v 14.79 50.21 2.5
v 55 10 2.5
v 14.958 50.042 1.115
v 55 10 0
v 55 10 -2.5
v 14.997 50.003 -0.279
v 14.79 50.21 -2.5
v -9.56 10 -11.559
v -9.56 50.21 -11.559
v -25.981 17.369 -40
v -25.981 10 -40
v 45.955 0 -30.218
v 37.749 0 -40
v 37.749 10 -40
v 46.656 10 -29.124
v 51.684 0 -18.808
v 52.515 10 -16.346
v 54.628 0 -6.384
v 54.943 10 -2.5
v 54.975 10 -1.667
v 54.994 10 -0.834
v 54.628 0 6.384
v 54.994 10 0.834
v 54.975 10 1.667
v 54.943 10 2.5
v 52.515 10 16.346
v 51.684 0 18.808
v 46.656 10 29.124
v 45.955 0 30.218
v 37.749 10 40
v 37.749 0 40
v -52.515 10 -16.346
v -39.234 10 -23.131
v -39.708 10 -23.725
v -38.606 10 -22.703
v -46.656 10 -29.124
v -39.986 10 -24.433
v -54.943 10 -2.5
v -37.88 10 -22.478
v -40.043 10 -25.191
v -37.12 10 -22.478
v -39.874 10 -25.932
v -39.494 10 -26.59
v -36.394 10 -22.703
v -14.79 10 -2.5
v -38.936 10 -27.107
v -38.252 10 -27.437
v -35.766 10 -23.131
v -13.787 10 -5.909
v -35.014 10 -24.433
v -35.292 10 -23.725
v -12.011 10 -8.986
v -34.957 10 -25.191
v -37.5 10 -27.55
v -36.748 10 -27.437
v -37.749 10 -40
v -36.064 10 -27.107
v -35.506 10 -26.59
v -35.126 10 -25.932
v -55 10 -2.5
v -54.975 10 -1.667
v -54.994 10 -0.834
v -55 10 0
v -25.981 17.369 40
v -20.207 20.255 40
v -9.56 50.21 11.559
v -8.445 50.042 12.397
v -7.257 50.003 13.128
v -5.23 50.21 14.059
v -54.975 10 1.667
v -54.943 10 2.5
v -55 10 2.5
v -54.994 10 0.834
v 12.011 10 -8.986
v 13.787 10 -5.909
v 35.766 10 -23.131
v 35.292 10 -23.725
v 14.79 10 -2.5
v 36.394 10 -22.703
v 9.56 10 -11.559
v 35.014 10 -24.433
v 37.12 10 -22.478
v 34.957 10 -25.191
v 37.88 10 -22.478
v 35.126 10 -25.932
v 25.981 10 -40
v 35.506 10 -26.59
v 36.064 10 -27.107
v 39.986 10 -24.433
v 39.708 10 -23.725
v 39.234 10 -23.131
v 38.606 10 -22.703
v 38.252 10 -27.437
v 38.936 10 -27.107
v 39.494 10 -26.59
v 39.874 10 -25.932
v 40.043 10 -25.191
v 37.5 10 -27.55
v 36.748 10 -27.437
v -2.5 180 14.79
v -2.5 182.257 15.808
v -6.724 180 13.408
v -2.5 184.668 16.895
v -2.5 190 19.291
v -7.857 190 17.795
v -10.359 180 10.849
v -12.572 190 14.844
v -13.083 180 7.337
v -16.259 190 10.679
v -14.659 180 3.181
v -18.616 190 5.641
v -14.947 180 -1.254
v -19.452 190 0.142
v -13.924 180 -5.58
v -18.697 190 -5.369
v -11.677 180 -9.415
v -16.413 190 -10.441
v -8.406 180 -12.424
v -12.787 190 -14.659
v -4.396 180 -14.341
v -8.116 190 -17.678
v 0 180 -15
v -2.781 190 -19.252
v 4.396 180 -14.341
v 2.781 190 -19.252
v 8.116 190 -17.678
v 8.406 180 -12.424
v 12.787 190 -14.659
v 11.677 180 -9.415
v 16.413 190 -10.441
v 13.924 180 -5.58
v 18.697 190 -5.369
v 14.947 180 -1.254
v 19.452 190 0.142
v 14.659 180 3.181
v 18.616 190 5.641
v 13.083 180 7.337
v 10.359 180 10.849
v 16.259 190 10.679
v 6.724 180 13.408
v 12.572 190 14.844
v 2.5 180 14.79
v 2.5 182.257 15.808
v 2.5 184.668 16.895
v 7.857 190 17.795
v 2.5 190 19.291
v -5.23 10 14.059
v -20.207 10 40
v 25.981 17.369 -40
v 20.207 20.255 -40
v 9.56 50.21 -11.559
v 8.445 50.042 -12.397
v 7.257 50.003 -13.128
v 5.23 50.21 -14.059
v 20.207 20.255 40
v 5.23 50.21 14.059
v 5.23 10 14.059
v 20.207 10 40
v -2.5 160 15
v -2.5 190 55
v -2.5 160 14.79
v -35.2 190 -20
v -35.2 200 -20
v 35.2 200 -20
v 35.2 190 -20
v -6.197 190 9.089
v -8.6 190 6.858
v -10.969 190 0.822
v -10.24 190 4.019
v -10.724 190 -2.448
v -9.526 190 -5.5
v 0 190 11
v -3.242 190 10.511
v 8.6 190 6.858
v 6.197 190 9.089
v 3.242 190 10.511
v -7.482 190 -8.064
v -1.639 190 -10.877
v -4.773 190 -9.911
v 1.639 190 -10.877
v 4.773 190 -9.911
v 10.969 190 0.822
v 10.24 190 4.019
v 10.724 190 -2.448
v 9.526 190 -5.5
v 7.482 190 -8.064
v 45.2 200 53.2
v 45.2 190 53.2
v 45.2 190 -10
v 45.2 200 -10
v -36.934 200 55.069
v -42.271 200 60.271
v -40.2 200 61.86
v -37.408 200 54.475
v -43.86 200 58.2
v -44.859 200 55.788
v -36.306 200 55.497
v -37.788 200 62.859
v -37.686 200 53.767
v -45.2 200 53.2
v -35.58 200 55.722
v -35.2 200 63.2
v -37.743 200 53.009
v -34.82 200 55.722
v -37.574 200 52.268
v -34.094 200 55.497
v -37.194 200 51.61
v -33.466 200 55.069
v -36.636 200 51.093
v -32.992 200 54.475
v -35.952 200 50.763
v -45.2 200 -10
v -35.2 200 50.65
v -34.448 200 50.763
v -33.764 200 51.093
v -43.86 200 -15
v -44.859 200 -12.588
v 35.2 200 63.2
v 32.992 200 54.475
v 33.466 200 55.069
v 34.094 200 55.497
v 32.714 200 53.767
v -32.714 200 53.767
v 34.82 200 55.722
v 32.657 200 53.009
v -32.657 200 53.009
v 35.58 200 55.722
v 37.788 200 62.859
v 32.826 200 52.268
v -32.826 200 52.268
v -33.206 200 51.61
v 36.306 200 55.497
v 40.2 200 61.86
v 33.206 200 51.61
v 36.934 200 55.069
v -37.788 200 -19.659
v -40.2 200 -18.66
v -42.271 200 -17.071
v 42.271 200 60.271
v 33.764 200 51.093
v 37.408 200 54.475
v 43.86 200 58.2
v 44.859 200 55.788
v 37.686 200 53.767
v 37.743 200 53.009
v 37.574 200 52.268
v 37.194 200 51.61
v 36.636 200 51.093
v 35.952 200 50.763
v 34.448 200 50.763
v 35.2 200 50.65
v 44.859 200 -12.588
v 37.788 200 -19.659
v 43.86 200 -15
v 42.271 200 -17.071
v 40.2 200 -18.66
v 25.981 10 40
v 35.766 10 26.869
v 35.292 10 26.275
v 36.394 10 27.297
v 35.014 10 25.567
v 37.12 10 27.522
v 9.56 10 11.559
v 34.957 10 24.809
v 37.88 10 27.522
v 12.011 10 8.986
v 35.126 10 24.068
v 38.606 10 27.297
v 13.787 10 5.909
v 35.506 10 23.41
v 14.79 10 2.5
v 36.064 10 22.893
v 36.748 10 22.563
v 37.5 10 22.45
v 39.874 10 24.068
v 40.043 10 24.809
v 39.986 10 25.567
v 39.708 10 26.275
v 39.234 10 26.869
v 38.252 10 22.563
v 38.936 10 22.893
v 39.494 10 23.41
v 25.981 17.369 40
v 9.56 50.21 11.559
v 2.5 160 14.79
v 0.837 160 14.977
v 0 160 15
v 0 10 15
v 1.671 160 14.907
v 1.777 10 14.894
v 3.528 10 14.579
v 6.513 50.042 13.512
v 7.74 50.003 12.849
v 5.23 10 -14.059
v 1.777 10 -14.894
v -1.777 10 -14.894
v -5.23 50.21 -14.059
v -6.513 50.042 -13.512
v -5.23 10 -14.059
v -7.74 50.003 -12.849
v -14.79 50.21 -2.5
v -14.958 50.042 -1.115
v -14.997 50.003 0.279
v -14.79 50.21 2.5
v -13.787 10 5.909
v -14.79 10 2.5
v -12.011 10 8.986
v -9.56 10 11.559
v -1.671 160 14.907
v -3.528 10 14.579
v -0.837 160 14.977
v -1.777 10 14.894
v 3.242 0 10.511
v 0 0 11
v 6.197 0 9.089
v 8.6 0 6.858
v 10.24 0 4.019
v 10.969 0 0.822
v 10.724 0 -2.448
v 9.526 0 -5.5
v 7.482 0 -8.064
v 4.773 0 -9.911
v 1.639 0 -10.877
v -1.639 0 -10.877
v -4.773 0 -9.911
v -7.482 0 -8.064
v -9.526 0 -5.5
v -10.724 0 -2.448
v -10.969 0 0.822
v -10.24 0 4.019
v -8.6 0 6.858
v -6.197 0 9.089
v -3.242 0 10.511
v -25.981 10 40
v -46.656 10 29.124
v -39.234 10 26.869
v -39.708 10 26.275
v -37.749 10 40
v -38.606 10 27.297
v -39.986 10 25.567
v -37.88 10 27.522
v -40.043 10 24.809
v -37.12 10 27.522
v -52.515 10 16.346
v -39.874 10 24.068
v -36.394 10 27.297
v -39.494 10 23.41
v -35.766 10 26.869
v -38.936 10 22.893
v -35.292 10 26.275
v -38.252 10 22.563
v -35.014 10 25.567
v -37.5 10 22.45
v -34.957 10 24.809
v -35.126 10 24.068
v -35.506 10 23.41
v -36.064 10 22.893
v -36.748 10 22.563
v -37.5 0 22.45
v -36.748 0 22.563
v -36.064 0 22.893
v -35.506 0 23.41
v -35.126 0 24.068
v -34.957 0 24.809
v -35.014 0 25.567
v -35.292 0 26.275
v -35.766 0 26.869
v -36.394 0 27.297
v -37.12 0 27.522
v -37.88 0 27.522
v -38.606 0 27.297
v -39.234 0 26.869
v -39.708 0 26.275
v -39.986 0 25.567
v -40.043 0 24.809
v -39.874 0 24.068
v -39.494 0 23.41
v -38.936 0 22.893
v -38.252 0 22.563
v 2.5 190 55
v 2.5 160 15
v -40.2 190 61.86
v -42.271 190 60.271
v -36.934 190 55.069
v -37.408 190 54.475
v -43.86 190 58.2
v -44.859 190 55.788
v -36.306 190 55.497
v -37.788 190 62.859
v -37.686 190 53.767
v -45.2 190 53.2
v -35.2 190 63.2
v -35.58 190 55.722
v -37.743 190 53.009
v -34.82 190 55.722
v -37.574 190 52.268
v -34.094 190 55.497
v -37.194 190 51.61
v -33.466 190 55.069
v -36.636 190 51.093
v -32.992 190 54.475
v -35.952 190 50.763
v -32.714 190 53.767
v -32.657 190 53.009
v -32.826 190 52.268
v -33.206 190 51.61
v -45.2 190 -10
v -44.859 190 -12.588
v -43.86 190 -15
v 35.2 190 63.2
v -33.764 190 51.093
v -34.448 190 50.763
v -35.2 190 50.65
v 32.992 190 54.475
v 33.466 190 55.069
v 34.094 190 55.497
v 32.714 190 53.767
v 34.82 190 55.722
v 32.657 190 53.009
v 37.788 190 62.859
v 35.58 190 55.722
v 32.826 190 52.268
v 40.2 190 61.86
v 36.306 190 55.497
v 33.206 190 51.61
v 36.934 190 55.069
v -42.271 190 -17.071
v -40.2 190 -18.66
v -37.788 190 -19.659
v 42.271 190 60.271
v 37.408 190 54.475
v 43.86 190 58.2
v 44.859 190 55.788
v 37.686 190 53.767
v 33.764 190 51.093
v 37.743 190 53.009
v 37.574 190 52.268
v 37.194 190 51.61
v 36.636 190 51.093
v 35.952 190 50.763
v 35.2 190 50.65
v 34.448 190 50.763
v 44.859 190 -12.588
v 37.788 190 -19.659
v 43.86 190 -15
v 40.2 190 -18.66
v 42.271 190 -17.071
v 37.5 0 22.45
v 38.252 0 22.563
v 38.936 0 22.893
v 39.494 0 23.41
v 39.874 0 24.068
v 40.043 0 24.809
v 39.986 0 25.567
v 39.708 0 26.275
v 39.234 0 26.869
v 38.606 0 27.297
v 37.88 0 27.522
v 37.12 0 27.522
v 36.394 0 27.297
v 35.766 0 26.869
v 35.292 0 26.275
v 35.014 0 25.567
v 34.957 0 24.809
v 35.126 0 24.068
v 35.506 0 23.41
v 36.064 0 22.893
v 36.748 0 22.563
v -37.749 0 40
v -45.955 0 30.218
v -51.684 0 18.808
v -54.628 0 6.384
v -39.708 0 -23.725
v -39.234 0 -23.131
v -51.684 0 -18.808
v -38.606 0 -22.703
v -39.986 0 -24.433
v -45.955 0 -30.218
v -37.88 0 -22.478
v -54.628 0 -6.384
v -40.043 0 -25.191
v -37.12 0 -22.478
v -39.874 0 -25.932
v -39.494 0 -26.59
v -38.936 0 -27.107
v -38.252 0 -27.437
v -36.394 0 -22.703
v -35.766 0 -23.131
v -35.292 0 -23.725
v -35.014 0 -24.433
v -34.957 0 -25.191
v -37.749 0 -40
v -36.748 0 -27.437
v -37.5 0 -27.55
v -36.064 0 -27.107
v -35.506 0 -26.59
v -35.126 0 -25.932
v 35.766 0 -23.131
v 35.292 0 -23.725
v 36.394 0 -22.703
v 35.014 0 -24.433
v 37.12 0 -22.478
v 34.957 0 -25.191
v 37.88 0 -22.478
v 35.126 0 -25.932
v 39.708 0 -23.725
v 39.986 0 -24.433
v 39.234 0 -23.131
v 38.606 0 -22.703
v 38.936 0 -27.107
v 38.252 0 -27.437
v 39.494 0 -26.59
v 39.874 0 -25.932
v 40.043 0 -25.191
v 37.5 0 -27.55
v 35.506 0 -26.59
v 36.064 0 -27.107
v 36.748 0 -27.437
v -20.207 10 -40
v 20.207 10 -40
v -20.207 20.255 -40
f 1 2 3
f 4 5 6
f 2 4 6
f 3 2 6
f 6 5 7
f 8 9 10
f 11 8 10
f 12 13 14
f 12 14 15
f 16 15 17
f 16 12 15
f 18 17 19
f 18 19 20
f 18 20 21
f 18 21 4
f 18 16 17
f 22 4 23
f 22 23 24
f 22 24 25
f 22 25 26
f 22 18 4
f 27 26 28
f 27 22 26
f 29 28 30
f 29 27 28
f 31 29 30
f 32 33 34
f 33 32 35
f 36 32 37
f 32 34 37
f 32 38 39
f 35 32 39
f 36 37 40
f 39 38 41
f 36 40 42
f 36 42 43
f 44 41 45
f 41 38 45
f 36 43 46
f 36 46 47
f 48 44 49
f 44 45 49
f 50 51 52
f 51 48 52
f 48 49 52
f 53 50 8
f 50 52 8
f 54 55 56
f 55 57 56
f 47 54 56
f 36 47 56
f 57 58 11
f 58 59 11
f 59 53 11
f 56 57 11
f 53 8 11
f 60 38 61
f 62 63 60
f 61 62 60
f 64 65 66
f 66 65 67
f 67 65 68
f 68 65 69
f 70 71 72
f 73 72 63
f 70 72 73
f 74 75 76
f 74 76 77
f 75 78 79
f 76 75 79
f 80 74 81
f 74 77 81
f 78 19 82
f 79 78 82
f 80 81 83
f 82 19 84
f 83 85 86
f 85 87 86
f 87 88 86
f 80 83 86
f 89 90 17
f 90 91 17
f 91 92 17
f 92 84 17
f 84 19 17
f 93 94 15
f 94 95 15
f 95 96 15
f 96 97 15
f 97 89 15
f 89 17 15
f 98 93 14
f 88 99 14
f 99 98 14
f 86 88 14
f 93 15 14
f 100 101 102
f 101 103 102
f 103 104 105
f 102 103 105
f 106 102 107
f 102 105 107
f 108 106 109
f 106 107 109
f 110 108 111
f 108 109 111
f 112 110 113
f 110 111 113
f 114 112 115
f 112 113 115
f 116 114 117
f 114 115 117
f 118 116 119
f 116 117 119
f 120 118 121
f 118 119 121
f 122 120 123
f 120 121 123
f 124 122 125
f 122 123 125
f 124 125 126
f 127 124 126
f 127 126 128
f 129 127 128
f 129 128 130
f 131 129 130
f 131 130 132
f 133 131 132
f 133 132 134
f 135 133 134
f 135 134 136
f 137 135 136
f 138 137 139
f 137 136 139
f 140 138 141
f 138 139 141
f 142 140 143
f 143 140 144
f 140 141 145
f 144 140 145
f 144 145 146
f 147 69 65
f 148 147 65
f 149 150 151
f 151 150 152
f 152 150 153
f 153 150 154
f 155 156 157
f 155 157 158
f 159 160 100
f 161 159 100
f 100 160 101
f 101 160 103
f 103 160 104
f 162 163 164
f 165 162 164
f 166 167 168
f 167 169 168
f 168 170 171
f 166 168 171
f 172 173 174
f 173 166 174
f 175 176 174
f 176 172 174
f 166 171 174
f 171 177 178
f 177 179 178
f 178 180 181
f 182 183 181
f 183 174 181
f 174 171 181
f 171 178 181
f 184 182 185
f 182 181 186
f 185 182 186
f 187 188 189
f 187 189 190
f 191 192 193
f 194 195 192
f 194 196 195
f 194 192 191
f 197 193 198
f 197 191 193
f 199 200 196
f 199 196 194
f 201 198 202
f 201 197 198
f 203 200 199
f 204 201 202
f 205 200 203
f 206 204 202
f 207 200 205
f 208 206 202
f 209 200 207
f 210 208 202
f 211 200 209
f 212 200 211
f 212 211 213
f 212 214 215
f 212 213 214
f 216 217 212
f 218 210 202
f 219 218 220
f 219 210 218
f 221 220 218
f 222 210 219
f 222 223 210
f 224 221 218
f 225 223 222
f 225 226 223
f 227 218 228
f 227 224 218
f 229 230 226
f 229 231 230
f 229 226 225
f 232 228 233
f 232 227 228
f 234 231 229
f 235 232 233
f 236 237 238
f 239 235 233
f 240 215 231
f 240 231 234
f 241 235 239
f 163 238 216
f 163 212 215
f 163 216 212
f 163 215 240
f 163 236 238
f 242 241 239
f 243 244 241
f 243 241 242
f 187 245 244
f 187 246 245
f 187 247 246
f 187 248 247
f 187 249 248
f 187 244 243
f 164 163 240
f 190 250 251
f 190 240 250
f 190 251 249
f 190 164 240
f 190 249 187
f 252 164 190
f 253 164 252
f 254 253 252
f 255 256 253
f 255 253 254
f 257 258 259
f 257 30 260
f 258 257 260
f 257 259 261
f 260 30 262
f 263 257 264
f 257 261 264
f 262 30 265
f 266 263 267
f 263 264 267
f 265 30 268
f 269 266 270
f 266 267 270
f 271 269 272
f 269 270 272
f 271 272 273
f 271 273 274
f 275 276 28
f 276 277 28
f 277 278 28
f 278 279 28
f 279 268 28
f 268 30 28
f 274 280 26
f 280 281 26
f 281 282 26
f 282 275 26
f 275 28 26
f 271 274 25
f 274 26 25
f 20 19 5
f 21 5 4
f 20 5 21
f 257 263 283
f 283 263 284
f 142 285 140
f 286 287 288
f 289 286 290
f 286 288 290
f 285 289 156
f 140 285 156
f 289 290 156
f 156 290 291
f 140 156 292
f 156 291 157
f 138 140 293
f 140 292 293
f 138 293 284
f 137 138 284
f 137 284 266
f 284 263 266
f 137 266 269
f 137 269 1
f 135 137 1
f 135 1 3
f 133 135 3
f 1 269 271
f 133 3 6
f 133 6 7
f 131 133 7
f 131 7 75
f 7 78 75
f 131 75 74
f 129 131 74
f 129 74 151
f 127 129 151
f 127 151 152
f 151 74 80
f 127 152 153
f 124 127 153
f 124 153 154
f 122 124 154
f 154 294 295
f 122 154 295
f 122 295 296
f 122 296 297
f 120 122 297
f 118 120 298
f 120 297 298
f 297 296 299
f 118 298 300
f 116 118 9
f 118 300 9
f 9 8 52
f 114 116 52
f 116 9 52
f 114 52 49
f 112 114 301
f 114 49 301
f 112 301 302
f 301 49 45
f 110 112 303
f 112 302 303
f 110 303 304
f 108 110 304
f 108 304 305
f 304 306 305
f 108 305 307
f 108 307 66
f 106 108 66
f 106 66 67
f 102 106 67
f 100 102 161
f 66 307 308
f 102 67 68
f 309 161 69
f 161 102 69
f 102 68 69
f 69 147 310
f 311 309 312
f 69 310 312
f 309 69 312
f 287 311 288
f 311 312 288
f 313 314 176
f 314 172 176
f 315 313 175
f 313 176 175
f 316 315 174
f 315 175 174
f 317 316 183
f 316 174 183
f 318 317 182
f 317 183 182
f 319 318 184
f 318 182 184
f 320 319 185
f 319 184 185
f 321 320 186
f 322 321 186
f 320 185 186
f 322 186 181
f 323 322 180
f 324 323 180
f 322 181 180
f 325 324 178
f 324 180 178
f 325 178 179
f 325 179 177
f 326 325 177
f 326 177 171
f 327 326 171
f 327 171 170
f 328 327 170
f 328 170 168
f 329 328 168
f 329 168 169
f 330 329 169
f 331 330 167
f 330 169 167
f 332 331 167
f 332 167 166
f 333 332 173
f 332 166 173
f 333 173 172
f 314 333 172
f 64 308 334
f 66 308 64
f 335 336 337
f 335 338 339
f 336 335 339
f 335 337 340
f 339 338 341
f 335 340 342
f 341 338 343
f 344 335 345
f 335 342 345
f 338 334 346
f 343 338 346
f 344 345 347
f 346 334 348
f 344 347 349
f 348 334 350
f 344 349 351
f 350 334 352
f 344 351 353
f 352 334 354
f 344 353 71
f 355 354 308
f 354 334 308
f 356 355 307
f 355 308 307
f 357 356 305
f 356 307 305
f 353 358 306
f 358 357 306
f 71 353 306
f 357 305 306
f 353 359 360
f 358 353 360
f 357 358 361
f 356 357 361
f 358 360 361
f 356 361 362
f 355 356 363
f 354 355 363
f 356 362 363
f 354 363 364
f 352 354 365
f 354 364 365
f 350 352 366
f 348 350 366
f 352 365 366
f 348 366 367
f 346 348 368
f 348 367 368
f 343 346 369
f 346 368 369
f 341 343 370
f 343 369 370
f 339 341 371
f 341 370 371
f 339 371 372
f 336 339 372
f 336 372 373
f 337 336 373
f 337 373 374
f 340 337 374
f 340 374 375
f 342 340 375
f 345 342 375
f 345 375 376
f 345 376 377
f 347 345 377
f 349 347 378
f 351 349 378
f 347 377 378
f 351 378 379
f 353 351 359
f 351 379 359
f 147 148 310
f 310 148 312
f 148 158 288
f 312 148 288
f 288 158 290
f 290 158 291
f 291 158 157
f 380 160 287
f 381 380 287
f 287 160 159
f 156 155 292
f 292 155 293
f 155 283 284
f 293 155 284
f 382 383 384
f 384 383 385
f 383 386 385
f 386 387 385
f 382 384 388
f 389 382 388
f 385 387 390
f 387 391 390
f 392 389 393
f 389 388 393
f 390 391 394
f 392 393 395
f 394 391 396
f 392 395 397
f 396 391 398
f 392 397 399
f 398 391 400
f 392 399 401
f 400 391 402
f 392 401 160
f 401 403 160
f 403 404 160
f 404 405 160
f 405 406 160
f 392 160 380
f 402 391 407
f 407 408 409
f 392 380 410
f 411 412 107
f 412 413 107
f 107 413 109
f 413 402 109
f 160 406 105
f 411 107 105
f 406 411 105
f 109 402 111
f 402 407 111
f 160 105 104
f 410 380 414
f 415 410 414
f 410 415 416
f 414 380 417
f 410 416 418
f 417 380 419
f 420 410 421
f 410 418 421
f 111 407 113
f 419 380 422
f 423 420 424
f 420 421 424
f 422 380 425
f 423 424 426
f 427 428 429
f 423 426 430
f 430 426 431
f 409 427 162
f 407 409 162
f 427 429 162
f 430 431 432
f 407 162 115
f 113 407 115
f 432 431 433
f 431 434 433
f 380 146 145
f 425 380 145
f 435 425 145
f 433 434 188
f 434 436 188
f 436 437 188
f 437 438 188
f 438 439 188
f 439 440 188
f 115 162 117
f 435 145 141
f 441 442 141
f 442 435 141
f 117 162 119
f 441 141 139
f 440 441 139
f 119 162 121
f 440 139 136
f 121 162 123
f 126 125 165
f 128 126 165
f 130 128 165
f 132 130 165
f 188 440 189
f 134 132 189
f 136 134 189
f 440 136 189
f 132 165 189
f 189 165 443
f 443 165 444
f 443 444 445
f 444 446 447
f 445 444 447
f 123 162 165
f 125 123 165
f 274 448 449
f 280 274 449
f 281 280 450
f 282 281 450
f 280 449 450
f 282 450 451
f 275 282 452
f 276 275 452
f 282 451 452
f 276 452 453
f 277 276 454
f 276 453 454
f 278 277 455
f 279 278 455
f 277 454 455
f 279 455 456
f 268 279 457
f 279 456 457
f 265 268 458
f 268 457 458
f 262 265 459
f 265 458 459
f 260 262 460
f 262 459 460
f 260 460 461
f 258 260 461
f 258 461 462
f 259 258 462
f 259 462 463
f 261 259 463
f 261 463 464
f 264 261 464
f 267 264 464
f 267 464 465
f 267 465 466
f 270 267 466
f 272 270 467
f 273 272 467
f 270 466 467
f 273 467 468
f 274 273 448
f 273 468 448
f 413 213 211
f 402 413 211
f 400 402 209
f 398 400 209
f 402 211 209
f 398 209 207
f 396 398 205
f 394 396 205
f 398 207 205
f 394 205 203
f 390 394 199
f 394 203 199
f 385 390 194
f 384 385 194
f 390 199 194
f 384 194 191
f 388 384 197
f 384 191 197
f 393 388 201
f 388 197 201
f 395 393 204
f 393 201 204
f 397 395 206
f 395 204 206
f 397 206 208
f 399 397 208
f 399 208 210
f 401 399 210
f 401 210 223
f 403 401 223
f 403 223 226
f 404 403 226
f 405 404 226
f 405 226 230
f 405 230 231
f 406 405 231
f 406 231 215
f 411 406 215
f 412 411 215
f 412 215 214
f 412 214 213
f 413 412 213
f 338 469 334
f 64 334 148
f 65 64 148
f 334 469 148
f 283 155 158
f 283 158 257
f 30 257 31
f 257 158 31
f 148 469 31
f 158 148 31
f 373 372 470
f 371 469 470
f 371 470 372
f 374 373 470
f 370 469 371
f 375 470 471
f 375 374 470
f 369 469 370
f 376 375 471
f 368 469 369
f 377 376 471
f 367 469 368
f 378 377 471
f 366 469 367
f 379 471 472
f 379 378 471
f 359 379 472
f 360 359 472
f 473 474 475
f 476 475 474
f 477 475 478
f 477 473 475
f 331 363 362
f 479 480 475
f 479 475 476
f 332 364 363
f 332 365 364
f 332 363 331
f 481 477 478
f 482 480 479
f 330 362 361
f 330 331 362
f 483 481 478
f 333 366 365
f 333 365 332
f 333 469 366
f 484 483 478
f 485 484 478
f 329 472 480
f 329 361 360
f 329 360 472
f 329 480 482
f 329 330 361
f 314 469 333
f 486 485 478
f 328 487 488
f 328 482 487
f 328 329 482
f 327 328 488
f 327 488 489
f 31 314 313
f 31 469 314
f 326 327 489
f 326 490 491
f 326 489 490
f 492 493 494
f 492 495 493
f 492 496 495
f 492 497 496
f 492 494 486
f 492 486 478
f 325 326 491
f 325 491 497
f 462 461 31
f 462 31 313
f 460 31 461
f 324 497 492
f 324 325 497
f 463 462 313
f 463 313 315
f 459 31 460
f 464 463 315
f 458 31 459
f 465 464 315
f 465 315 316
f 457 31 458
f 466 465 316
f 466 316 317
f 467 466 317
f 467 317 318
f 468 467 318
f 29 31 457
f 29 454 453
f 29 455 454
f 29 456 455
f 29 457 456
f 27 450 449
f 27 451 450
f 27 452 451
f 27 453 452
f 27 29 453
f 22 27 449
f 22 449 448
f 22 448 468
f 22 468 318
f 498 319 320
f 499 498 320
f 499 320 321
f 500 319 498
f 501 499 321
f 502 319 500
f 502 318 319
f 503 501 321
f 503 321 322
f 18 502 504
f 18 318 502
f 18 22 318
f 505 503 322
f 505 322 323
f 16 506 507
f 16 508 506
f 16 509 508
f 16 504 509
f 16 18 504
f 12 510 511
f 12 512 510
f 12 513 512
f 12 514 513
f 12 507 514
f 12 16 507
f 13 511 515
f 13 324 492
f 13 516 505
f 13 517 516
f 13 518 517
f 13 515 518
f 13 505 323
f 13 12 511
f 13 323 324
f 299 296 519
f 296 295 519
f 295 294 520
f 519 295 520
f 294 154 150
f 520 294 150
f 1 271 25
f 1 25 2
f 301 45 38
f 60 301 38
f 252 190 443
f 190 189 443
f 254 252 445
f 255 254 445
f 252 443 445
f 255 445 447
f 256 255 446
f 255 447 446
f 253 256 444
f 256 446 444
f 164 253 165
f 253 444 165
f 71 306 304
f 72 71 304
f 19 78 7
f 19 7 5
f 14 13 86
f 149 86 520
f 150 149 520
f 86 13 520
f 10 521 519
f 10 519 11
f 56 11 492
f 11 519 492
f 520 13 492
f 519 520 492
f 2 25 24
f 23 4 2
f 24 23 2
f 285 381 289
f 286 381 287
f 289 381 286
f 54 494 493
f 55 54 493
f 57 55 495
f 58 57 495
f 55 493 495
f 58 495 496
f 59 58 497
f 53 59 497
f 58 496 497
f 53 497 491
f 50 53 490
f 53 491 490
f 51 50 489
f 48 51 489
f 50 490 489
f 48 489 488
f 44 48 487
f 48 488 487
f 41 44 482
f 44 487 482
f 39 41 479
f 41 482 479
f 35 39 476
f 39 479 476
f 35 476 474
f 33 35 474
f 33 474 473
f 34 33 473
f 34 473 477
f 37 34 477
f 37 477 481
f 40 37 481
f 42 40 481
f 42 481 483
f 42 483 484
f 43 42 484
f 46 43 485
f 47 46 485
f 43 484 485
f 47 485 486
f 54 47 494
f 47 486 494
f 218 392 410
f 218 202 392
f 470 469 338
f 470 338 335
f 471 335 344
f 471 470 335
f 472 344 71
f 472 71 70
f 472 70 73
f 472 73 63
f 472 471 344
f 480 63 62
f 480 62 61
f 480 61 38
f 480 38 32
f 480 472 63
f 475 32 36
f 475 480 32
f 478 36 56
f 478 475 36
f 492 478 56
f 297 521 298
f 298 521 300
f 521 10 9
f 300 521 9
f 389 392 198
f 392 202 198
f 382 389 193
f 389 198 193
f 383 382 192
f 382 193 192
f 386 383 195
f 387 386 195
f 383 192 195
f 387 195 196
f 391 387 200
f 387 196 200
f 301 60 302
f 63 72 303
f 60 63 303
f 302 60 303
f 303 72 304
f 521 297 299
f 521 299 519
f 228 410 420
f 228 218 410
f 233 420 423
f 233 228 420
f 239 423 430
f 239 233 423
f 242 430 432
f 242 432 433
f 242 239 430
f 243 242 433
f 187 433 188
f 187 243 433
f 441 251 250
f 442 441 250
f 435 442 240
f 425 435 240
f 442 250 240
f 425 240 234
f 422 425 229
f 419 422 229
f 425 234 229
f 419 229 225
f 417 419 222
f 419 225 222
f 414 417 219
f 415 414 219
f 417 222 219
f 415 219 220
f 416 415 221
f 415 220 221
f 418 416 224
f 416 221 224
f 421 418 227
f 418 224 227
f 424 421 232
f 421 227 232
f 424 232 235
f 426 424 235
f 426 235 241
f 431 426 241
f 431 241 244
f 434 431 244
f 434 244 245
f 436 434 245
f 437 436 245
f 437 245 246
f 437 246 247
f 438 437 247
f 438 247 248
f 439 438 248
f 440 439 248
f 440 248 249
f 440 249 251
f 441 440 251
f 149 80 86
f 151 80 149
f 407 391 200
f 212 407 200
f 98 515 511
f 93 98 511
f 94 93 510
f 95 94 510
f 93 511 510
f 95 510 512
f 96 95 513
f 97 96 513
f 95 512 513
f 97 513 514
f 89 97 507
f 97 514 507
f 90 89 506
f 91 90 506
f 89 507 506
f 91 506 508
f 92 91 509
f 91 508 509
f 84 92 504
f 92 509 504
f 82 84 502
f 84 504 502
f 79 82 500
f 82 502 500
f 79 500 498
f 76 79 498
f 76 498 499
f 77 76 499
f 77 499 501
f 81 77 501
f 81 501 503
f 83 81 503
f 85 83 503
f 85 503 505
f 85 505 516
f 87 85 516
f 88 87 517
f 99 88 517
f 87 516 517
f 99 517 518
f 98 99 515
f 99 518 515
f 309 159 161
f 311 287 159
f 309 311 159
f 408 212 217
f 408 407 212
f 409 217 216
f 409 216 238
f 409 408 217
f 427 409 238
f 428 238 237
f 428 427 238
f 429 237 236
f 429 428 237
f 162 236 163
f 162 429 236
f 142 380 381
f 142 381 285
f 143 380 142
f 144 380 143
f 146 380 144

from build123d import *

# Parameters (mm, degrees)
SKETCH1_R                      = 2.55
SKETCH1_R_2                    = 11
BASE_DEPTH                     = 5
SKETCH1_3_R                    = 15
SKETCH1_3_R_2                  = 11
STEM_DEPTH                     = 200
SKETCH4_W                      = 90.4
SKETCH4_H                      = 40
TOP_PLATE_DEPTH                = 10
SKETCH6_W                      = 90.4
SKETCH6_H                      = 10
EXTRA_BACK_DEPTH               = 43.2
RIB1_START                     = -2.5
RIB1_DEPTH                     = 5
CUT_EXTRUDE1_REACH             = 217.059
SKETCH10_R                     = 2.55
CUT_EXTRUDE1_DIRECTION_2_DEPTH = 216.0592709
FILLET1_R                      = 10
FILLET2_R                      = 10
SKETCH11_R                     = 55
NEW_BASE_DEPTH                 = 10
RIB2_START                     = -2.5
RIB2_DEPTH                     = 5
CIRPATTERN7_COUNT              = 6
SKETCH13_R                     = 2.55
CUT_EXTRUDE2_DEPTH             = 10
FILLET3_R                      = 10
SKETCH15_R                     = 11
REMOVE_CENTER_DEPTH            = 208.65172766
BASE_CUT_DEPTH                 = 40
CHAMFER2_SIZE                  = 10
CHAMFER2_SIZE2                 = 4.452286853


with BuildPart() as part:
    # Sketch1 → base (new body)
    with BuildSketch(Plane(origin=(0, 0, 0), x_dir=(1, 0, 0), z_dir=(0, 1, 0))):
        with BuildLine():
            Line((-16, 25.377155081), (-42.833333333, 8.459051694))
            ThreePointArc((-42.833333333, 8.459051694), (-47.5, 0), (-42.833333333, -8.459051694))
            Line((-42.833333333, -8.459051694), (-16, -25.377155081))
            ThreePointArc((-16, -25.377155081), (0, -30), (16, -25.377155081))
            Line((16, -25.377155081), (42.833333333, -8.459051694))
            ThreePointArc((42.833333333, -8.459051694), (47.5, 0), (42.833333333, 8.459051694))
            Line((42.833333333, 8.459051694), (16, 25.377155081))
            ThreePointArc((16, 25.377155081), (0, 30), (-16, 25.377155081))
        make_face()
        with Locations(Location((-37.5, 0, 0), (0, 0, 270))):
            Circle(SKETCH1_R, mode=Mode.SUBTRACT)
        with Locations(Location((37.5, 0, 0), (0, 0, 270))):
            Circle(SKETCH1_R, mode=Mode.SUBTRACT)
        with Locations(Location((0, 0, 0), (0, 0, 270))):
            Circle(SKETCH1_R_2, mode=Mode.SUBTRACT)
    extrude(amount=BASE_DEPTH)

    # Sketch1<3> → stem (add)
    with BuildSketch(Plane(origin=(0, 0, 0), x_dir=(1, 0, 0), z_dir=(0, 1, 0))):
        with Locations(Location((0, 0, 0), (0, 0, 270))):
            Circle(SKETCH1_3_R)
        with Locations(Location((0, 0, 0), (0, 0, 270))):
            Circle(SKETCH1_3_R_2, mode=Mode.SUBTRACT)
    extrude(amount=STEM_DEPTH)

    # Sketch4 → top plate (add)
    with BuildSketch(Plane(origin=(0, 200, 0), x_dir=(1, 0, 0), z_dir=(0, 1, 0))):
        Rectangle(SKETCH4_W, SKETCH4_H)
    extrude(amount=-TOP_PLATE_DEPTH)

    # Sketch6 → extra back (add)
    with BuildSketch(Plane.XY.offset(20)):
        with Locations((0, 195)):
            Rectangle(SKETCH6_W, SKETCH6_H)
    extrude(amount=EXTRA_BACK_DEPTH)

    # Rib1: read off the stored shape, not the designer's step
    # Rib1 outline → Rib1 (add)
    with BuildSketch(Plane(origin=(0, 0, 0), x_dir=(0, 0, -1), z_dir=(1, 0, 0)).offset(RIB1_START)):
        Polygon((-15, 160), (-14.790199458, 160), (-14.790199458, 190), (-55, 190), align=None)
    extrude(amount=RIB1_DEPTH)

    # Sketch10 → Cut-Extrude1 (cut, up to next)
    with BuildSketch(Plane(origin=(0, 200, 0), x_dir=(1, 0, 0), z_dir=(0, 1, 0)), mode=Mode.PRIVATE) as cut_extrude1_sk1:
        with Locations(Location((35.2, -53.2, 0), (0, 0, 90))):
            Circle(SKETCH10_R)
    cut_extrude1_tool1 = extrude(cut_extrude1_sk1.sketch, amount=-CUT_EXTRUDE1_REACH, mode=Mode.PRIVATE) & part.part
    # Sketch10 → Cut-Extrude1 (cut, up to next)
    with BuildSketch(Plane(origin=(0, 200, 0), x_dir=(1, 0, 0), z_dir=(0, 1, 0)), mode=Mode.PRIVATE) as cut_extrude1_sk2:
        with Locations(Location((-35.2, -53.2, 0), (0, 0, 90))):
            Circle(SKETCH10_R)
    cut_extrude1_tool2 = extrude(cut_extrude1_sk2.sketch, amount=-CUT_EXTRUDE1_REACH, mode=Mode.PRIVATE) & part.part
    add(cut_extrude1_tool1.solids().sort_by_distance((35.2, 200, 53.2))[0], mode=Mode.SUBTRACT)
    add(cut_extrude1_tool2.solids().sort_by_distance((-35.2, 200, 53.2))[0], mode=Mode.SUBTRACT)

    # Sketch10 → Cut-Extrude1 direction 2 (cut)
    with BuildSketch(Plane(origin=(0, 200, 0), x_dir=(1, 0, 0), z_dir=(0, 1, 0))):
        with Locations(Location((35.2, -53.2, 0), (0, 0, 90))):
            Circle(SKETCH10_R)
        with Locations(Location((-35.2, -53.2, 0), (0, 0, 90))):
            Circle(SKETCH10_R)
    extrude(amount=CUT_EXTRUDE1_DIRECTION_2_DEPTH, mode=Mode.SUBTRACT)

    # Fillet1
    fillet1_edges = [part.edges().sort_by_distance(p)[0] for p in [
        (-45.2, 195, 63.2),
    ]]
    fillet(fillet1_edges, radius=FILLET1_R)

    # Fillet2
    fillet2_edges = [part.edges().sort_by_distance(p)[0] for p in [
        (45.2, 195, 63.2),
    ]]
    fillet(fillet2_edges, radius=FILLET2_R)

    # Sketch11 → new base (add)
    with BuildSketch(Plane.XZ):
        with Locations(Location((0, 0, 0), (0, 0, 270))):
            Circle(SKETCH11_R)
    extrude(amount=-NEW_BASE_DEPTH)

    # Rib2: read off the stored shape, not the designer's step
    # Rib2 outline → Rib2 (add)
    with BuildSketch(Plane.XY.offset(RIB2_START)):
        Polygon((13, 10), (55, 10), (13, 52), align=None)
    rib2 = extrude(amount=RIB2_DEPTH)

    # CirPattern7: Rib2 ×6 about axis
    cirpattern7_axis = Axis((0, 0, 0), (0, 1, 0))
    for i in range(1, CIRPATTERN7_COUNT):
        add(rib2.rotate(cirpattern7_axis, i * 360 / CIRPATTERN7_COUNT))

    # Sketch13 → Cut-Extrude2 (cut)
    with BuildSketch(Plane.XZ):
        with Locations(Location((-37.5, -25, 0), (0, 0, 270))):
            Circle(SKETCH13_R)
        with Locations(Location((-37.5, 25, 0), (0, 0, 270))):
            Circle(SKETCH13_R)
        with Locations(Location((37.5, 25, 0), (0, 0, 270))):
            Circle(SKETCH13_R)
        with Locations(Location((37.5, -25, 0), (0, 0, 270))):
            Circle(SKETCH13_R)
    extrude(amount=-CUT_EXTRUDE2_DEPTH, mode=Mode.SUBTRACT)

    # Fillet3
    fillet3_edges = [part.edges().sort_by_distance(p)[0] for p in [
        (45.2, 195, -20),
        (-45.2, 195, -20),
    ]]
    fillet(fillet3_edges, radius=FILLET3_R)

    # Sketch15 → remove center (cut, through all)
    with BuildSketch(Plane(origin=(0, 10, 0), x_dir=(1, 0, 0), z_dir=(0, 1, 0))):
        with Locations(Location((0, 0, 0), (0, 0, 270))):
            Circle(SKETCH15_R)
    extrude(amount=-REMOVE_CENTER_DEPTH, mode=Mode.SUBTRACT)

    # Sketch16 → base cut (cut)
    with BuildSketch(Plane.XZ):
        with BuildLine():
            Line((-37.749172176, 40), (37.749172176, 40))
            ThreePointArc((37.749172176, 40), (0, 55), (-37.749172176, 40))
        make_face()
        with BuildLine():
            ThreePointArc((-37.749172176, -40), (0, -55), (37.749172176, -40))
            Line((37.749172176, -40), (-37.749172176, -40))
        make_face()
    extrude(amount=-BASE_CUT_DEPTH, mode=Mode.SUBTRACT)


with BuildPart() as base_cut_kept_piece:
    # of the separate pieces the step leaves, the one the design keeps (base_cut_pieces_kept)
    add(part.part.solids().sort_by_distance((45.2, 190, -10))[0])

    # Chamfer2
    chamfer2_edges = [base_cut_kept_piece.edges().sort_by_distance(p)[0] for p in [
        (0, 190, -15),
    ]]
    chamfer2_side = [base_cut_kept_piece.faces().sort_by_distance(p)[0] for p in [
        (0, 100, -15),
    ]]
    chamfer(chamfer2_edges, length=CHAMFER2_SIZE, length2=CHAMFER2_SIZE2, reference=chamfer2_side[0])


solid = base_cut_kept_piece.part
